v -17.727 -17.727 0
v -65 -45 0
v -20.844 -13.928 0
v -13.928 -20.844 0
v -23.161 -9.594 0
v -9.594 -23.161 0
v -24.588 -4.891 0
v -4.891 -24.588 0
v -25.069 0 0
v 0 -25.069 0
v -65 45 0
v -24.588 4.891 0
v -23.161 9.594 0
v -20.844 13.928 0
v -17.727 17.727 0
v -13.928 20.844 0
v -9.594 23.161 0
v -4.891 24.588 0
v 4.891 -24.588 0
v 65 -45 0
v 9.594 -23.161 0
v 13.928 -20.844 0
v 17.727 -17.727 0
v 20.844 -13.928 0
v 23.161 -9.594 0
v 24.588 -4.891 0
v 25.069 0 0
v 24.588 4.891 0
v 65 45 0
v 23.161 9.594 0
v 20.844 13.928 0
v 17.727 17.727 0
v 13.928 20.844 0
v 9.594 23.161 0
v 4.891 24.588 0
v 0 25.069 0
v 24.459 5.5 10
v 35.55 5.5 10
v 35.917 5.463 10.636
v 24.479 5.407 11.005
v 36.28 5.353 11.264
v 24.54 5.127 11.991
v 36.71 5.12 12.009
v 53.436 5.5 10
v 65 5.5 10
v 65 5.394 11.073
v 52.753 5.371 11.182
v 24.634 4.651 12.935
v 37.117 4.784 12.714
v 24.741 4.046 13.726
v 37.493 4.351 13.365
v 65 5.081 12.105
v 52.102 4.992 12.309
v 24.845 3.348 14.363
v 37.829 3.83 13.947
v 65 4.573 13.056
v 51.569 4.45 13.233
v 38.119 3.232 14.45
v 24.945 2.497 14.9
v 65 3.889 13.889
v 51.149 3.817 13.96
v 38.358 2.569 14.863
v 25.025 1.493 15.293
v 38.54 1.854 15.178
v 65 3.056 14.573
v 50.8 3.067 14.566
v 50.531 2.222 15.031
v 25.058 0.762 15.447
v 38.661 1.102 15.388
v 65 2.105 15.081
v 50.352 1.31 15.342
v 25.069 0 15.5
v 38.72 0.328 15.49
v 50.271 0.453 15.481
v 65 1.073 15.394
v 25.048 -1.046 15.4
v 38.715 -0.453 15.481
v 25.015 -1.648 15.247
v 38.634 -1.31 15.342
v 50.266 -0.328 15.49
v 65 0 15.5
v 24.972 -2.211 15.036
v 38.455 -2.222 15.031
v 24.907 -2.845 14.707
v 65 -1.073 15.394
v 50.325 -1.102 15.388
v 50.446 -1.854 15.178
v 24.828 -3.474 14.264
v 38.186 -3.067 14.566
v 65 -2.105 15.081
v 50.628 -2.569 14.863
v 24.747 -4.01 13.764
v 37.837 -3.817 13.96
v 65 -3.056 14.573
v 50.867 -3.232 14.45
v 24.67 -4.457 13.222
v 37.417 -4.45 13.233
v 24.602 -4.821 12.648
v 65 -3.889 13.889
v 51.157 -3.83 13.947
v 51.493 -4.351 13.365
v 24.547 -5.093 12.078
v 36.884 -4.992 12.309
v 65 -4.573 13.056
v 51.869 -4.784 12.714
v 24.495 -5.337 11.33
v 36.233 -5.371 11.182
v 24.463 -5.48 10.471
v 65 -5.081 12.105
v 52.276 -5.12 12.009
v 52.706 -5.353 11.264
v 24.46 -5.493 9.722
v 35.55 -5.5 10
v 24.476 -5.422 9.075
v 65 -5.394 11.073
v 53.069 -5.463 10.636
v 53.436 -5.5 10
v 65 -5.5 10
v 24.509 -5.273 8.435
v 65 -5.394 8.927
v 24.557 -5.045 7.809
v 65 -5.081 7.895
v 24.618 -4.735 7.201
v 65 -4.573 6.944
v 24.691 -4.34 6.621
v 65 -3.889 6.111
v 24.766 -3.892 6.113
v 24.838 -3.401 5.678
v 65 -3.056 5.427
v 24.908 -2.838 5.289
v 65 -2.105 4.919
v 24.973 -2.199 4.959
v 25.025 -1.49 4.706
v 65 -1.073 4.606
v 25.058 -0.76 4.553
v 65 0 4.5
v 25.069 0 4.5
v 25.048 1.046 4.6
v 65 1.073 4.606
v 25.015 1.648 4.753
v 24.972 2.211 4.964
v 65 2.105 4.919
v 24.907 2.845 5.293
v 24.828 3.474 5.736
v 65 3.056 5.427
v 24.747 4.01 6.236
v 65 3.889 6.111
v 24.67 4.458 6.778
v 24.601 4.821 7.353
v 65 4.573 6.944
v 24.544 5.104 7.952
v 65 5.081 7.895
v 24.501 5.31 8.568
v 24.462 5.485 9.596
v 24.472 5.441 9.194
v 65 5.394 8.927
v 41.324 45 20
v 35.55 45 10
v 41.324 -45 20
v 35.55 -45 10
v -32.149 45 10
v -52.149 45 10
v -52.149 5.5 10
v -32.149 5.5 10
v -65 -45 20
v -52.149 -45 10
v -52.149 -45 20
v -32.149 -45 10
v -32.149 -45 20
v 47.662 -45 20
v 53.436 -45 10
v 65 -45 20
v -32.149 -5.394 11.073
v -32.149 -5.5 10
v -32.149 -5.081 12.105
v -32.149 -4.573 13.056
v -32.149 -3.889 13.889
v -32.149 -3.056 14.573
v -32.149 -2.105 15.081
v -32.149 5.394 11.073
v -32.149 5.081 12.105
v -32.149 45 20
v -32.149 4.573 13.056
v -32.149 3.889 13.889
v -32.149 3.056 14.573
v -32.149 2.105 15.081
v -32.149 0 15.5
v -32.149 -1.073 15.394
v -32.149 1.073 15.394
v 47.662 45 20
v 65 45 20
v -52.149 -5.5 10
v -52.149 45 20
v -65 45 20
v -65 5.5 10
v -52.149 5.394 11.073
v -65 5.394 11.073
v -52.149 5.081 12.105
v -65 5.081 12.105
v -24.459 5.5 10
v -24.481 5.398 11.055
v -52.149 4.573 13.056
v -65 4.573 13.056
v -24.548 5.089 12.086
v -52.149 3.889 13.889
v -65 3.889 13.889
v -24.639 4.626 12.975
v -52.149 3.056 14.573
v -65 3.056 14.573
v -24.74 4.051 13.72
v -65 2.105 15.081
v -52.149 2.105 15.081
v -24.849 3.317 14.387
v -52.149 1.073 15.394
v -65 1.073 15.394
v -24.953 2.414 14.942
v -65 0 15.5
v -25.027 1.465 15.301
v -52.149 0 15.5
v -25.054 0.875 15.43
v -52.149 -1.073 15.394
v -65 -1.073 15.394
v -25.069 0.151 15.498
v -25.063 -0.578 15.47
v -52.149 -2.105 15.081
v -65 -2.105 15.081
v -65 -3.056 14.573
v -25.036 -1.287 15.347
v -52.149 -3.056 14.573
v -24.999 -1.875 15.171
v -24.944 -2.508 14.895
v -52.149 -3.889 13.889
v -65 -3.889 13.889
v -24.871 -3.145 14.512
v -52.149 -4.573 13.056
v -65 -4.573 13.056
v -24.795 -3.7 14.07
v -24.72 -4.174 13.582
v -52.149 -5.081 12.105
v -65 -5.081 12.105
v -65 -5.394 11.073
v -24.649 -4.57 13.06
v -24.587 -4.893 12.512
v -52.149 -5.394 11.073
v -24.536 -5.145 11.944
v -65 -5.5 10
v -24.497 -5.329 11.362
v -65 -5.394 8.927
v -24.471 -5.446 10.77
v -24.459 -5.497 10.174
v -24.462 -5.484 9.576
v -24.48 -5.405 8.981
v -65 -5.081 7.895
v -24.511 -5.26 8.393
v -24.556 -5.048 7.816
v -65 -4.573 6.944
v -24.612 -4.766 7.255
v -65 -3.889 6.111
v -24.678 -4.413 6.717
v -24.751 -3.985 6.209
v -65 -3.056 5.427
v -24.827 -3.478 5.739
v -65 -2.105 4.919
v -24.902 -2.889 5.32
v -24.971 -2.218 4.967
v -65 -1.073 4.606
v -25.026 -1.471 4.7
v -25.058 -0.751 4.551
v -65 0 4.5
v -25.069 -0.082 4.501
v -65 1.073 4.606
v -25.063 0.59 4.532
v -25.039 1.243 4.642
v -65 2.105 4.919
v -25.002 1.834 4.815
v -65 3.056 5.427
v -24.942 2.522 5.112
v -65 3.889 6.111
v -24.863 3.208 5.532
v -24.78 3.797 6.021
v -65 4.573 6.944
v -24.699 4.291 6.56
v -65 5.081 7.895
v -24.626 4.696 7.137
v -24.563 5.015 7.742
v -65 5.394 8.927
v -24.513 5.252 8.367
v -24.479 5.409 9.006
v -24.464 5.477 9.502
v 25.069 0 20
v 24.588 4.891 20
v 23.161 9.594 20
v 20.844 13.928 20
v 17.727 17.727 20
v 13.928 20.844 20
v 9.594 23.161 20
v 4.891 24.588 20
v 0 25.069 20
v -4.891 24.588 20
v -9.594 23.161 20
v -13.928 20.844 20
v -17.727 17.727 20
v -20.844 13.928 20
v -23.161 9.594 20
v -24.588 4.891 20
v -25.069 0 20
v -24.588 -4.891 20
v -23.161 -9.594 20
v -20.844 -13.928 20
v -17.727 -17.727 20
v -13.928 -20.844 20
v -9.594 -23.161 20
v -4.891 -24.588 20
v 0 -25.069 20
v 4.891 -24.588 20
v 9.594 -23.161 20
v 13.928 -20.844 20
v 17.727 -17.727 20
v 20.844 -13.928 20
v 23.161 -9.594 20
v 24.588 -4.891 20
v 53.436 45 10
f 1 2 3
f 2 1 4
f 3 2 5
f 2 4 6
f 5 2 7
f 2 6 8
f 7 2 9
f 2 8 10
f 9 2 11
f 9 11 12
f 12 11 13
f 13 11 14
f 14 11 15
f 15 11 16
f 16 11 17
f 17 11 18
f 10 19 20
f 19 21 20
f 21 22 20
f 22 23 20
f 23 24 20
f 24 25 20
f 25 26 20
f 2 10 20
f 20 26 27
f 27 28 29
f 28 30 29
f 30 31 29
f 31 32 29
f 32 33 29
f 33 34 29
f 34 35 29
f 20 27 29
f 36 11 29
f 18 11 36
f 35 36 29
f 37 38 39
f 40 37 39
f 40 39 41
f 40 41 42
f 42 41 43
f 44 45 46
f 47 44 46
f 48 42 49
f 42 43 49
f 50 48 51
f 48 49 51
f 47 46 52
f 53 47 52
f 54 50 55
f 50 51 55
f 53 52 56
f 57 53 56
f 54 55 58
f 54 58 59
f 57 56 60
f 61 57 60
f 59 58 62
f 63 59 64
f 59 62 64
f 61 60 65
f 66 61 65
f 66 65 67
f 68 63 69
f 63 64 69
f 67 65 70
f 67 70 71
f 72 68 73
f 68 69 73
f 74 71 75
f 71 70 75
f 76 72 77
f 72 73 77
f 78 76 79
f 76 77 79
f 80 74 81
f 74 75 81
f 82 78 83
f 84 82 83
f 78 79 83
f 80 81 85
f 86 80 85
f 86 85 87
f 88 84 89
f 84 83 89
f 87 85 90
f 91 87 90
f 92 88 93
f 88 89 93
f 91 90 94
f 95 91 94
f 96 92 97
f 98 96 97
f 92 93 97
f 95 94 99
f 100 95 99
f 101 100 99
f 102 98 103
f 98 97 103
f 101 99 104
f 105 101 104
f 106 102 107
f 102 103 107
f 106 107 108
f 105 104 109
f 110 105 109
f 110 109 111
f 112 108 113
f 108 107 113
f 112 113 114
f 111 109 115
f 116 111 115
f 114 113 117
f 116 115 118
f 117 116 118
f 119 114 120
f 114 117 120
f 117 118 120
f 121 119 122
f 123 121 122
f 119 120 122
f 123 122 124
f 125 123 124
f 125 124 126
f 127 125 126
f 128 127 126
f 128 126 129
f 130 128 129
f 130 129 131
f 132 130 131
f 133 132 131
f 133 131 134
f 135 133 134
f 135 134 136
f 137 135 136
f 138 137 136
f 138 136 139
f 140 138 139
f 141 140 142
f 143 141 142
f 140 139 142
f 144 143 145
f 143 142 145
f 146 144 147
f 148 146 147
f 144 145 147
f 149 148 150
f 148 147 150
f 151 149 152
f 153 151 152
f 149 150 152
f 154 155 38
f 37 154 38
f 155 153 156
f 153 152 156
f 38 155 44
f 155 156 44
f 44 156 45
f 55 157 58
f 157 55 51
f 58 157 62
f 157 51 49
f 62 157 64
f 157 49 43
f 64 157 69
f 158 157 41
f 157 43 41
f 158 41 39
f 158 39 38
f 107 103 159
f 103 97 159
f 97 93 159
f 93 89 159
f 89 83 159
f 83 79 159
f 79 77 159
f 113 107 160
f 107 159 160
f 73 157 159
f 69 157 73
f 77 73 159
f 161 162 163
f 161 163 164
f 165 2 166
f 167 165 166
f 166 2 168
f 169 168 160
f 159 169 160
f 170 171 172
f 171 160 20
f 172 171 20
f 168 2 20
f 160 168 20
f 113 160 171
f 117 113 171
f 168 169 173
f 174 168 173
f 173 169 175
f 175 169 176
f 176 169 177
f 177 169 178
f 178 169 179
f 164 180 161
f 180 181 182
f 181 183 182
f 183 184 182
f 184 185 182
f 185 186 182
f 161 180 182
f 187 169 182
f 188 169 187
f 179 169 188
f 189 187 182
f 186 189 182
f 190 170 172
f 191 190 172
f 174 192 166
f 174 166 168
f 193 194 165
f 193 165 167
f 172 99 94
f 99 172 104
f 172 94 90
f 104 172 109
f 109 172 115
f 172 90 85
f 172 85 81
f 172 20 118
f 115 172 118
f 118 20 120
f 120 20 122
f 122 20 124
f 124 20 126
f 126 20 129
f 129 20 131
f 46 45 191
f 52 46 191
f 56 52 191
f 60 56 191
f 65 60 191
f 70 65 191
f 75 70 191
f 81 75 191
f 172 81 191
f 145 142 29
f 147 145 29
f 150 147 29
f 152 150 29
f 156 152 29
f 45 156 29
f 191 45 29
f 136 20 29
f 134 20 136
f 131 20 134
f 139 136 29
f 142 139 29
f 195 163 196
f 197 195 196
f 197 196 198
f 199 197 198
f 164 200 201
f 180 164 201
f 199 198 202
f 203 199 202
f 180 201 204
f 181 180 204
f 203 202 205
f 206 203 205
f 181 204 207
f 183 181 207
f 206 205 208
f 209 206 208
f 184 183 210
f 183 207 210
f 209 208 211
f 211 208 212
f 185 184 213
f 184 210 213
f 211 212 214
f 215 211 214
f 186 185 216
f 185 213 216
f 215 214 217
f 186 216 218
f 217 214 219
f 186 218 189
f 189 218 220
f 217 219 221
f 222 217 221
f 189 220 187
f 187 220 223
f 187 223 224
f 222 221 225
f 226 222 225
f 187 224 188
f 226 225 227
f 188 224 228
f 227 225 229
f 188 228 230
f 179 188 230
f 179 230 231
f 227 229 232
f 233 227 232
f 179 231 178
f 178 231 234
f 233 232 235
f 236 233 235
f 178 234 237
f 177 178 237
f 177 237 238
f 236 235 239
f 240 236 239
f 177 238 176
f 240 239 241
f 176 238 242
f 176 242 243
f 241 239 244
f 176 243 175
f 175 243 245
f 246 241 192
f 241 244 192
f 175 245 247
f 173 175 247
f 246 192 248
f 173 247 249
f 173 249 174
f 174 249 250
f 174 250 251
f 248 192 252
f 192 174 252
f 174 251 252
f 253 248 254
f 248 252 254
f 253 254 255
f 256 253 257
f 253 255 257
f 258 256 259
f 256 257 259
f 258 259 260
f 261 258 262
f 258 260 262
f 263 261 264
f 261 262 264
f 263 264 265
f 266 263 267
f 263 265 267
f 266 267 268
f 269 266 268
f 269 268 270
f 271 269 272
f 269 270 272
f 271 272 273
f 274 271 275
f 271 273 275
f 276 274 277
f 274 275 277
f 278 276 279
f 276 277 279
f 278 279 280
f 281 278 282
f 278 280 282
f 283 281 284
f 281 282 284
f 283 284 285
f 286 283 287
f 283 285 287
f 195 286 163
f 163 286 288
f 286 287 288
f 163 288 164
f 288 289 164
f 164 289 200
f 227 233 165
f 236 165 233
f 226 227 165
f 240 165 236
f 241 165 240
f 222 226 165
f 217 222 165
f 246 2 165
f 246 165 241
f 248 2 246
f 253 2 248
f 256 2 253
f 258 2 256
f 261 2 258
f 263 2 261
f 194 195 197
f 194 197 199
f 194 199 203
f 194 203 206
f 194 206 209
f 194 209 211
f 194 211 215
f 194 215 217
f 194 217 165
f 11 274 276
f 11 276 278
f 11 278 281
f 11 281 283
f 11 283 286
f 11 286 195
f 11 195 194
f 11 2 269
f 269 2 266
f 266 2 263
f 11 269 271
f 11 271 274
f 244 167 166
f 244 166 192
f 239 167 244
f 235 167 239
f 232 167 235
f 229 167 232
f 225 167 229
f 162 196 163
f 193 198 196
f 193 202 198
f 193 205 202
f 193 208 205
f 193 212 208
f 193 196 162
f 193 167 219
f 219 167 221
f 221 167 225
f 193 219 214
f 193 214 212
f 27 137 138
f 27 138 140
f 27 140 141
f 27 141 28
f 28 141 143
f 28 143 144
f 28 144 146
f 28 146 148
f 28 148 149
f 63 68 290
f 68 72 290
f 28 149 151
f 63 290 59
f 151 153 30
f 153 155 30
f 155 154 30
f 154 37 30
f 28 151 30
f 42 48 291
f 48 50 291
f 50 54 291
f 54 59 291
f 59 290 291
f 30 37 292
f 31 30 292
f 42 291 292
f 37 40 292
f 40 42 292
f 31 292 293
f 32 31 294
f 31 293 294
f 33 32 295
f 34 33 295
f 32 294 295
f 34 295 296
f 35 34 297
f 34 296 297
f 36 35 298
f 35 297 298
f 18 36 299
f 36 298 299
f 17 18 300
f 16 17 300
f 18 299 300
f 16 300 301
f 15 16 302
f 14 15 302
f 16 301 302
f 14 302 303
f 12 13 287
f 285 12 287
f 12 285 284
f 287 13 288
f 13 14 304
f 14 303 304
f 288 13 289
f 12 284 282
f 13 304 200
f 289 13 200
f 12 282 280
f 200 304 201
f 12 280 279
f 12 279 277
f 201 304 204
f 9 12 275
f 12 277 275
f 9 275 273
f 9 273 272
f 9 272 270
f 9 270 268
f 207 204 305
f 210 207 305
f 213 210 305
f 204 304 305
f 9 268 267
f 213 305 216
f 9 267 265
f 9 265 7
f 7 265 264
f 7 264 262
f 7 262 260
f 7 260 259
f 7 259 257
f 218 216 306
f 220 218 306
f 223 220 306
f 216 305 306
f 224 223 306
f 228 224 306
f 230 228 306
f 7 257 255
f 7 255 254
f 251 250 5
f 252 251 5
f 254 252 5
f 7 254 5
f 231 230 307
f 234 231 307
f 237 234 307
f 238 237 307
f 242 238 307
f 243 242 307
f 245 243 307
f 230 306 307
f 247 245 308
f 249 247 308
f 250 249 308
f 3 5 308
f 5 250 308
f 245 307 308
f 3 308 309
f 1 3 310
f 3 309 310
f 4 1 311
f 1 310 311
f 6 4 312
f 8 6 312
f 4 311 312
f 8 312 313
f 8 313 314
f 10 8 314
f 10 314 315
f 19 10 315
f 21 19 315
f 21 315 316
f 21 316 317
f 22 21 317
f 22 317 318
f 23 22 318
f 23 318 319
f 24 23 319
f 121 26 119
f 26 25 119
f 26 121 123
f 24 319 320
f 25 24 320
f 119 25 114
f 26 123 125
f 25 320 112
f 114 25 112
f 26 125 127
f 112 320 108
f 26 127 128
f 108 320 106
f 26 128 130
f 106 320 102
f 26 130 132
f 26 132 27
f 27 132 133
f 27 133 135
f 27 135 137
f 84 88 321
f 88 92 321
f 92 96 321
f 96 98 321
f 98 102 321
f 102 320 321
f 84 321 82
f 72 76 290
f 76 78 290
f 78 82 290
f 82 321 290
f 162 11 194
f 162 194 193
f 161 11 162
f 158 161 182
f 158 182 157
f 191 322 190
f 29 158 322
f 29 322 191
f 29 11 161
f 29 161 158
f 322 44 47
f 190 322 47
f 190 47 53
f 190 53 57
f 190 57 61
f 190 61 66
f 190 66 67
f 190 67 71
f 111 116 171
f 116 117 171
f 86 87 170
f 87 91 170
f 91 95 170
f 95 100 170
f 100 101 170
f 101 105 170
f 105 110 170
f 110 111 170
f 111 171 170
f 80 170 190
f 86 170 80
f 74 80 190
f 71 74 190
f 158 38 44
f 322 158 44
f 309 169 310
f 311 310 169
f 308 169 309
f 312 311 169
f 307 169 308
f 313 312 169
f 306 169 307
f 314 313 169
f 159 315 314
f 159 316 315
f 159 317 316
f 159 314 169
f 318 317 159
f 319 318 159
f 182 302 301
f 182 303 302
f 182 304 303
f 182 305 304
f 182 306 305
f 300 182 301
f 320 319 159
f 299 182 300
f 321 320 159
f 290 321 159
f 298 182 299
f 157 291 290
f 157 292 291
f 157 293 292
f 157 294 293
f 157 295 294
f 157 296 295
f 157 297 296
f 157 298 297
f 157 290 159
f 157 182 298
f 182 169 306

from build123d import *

# Parameters (mm, degrees)
F0_W     = 130
F0_H     = 90
F1_DEPTH = 20
F2_W     = 20
F2_H     = 90
F3_DEPTH = 10
F4_R     = 25.06944
F5_DEPTH = 20.001
F6_R     = 5.5
F7_DEPTH = 130.001
F9_DEPTH = 90.001


with BuildPart() as f1:
    # F0 (on Top) → F1 (new body)
    with BuildSketch(Plane.XY):
        Rectangle(F0_W, F0_H)
    extrude(amount=F1_DEPTH)

    # F2 (on face) → F3 (cut)
    with BuildSketch(Plane.XY.offset(20)):
        with Locations((-42.149333, 0)):
            Rectangle(F2_W, F2_H)
    extrude(amount=-F3_DEPTH, mode=Mode.SUBTRACT)

    # F4 (on face) → F5 (cut, through all)
    with BuildSketch(Plane.XY.offset(20)):
        Circle(F4_R)
    extrude(amount=-F5_DEPTH, mode=Mode.SUBTRACT)

    # F6 (on face) → F7 (cut, through all)
    with BuildSketch(Plane.YZ.offset(65)):
        with Locations((0, 10)):
            Circle(F6_R)
    extrude(amount=-F7_DEPTH, mode=Mode.SUBTRACT)

    # F8 (on face) → F9 (cut, through all)
    with BuildSketch(Plane.XZ.offset(45)):
        Polygon((47.662321, 20), (41.323712, 20), (35.550209, 10), (53.435824, 10), align=None)
    extrude(amount=-F9_DEPTH, mode=Mode.SUBTRACT)


solid = f1.part
